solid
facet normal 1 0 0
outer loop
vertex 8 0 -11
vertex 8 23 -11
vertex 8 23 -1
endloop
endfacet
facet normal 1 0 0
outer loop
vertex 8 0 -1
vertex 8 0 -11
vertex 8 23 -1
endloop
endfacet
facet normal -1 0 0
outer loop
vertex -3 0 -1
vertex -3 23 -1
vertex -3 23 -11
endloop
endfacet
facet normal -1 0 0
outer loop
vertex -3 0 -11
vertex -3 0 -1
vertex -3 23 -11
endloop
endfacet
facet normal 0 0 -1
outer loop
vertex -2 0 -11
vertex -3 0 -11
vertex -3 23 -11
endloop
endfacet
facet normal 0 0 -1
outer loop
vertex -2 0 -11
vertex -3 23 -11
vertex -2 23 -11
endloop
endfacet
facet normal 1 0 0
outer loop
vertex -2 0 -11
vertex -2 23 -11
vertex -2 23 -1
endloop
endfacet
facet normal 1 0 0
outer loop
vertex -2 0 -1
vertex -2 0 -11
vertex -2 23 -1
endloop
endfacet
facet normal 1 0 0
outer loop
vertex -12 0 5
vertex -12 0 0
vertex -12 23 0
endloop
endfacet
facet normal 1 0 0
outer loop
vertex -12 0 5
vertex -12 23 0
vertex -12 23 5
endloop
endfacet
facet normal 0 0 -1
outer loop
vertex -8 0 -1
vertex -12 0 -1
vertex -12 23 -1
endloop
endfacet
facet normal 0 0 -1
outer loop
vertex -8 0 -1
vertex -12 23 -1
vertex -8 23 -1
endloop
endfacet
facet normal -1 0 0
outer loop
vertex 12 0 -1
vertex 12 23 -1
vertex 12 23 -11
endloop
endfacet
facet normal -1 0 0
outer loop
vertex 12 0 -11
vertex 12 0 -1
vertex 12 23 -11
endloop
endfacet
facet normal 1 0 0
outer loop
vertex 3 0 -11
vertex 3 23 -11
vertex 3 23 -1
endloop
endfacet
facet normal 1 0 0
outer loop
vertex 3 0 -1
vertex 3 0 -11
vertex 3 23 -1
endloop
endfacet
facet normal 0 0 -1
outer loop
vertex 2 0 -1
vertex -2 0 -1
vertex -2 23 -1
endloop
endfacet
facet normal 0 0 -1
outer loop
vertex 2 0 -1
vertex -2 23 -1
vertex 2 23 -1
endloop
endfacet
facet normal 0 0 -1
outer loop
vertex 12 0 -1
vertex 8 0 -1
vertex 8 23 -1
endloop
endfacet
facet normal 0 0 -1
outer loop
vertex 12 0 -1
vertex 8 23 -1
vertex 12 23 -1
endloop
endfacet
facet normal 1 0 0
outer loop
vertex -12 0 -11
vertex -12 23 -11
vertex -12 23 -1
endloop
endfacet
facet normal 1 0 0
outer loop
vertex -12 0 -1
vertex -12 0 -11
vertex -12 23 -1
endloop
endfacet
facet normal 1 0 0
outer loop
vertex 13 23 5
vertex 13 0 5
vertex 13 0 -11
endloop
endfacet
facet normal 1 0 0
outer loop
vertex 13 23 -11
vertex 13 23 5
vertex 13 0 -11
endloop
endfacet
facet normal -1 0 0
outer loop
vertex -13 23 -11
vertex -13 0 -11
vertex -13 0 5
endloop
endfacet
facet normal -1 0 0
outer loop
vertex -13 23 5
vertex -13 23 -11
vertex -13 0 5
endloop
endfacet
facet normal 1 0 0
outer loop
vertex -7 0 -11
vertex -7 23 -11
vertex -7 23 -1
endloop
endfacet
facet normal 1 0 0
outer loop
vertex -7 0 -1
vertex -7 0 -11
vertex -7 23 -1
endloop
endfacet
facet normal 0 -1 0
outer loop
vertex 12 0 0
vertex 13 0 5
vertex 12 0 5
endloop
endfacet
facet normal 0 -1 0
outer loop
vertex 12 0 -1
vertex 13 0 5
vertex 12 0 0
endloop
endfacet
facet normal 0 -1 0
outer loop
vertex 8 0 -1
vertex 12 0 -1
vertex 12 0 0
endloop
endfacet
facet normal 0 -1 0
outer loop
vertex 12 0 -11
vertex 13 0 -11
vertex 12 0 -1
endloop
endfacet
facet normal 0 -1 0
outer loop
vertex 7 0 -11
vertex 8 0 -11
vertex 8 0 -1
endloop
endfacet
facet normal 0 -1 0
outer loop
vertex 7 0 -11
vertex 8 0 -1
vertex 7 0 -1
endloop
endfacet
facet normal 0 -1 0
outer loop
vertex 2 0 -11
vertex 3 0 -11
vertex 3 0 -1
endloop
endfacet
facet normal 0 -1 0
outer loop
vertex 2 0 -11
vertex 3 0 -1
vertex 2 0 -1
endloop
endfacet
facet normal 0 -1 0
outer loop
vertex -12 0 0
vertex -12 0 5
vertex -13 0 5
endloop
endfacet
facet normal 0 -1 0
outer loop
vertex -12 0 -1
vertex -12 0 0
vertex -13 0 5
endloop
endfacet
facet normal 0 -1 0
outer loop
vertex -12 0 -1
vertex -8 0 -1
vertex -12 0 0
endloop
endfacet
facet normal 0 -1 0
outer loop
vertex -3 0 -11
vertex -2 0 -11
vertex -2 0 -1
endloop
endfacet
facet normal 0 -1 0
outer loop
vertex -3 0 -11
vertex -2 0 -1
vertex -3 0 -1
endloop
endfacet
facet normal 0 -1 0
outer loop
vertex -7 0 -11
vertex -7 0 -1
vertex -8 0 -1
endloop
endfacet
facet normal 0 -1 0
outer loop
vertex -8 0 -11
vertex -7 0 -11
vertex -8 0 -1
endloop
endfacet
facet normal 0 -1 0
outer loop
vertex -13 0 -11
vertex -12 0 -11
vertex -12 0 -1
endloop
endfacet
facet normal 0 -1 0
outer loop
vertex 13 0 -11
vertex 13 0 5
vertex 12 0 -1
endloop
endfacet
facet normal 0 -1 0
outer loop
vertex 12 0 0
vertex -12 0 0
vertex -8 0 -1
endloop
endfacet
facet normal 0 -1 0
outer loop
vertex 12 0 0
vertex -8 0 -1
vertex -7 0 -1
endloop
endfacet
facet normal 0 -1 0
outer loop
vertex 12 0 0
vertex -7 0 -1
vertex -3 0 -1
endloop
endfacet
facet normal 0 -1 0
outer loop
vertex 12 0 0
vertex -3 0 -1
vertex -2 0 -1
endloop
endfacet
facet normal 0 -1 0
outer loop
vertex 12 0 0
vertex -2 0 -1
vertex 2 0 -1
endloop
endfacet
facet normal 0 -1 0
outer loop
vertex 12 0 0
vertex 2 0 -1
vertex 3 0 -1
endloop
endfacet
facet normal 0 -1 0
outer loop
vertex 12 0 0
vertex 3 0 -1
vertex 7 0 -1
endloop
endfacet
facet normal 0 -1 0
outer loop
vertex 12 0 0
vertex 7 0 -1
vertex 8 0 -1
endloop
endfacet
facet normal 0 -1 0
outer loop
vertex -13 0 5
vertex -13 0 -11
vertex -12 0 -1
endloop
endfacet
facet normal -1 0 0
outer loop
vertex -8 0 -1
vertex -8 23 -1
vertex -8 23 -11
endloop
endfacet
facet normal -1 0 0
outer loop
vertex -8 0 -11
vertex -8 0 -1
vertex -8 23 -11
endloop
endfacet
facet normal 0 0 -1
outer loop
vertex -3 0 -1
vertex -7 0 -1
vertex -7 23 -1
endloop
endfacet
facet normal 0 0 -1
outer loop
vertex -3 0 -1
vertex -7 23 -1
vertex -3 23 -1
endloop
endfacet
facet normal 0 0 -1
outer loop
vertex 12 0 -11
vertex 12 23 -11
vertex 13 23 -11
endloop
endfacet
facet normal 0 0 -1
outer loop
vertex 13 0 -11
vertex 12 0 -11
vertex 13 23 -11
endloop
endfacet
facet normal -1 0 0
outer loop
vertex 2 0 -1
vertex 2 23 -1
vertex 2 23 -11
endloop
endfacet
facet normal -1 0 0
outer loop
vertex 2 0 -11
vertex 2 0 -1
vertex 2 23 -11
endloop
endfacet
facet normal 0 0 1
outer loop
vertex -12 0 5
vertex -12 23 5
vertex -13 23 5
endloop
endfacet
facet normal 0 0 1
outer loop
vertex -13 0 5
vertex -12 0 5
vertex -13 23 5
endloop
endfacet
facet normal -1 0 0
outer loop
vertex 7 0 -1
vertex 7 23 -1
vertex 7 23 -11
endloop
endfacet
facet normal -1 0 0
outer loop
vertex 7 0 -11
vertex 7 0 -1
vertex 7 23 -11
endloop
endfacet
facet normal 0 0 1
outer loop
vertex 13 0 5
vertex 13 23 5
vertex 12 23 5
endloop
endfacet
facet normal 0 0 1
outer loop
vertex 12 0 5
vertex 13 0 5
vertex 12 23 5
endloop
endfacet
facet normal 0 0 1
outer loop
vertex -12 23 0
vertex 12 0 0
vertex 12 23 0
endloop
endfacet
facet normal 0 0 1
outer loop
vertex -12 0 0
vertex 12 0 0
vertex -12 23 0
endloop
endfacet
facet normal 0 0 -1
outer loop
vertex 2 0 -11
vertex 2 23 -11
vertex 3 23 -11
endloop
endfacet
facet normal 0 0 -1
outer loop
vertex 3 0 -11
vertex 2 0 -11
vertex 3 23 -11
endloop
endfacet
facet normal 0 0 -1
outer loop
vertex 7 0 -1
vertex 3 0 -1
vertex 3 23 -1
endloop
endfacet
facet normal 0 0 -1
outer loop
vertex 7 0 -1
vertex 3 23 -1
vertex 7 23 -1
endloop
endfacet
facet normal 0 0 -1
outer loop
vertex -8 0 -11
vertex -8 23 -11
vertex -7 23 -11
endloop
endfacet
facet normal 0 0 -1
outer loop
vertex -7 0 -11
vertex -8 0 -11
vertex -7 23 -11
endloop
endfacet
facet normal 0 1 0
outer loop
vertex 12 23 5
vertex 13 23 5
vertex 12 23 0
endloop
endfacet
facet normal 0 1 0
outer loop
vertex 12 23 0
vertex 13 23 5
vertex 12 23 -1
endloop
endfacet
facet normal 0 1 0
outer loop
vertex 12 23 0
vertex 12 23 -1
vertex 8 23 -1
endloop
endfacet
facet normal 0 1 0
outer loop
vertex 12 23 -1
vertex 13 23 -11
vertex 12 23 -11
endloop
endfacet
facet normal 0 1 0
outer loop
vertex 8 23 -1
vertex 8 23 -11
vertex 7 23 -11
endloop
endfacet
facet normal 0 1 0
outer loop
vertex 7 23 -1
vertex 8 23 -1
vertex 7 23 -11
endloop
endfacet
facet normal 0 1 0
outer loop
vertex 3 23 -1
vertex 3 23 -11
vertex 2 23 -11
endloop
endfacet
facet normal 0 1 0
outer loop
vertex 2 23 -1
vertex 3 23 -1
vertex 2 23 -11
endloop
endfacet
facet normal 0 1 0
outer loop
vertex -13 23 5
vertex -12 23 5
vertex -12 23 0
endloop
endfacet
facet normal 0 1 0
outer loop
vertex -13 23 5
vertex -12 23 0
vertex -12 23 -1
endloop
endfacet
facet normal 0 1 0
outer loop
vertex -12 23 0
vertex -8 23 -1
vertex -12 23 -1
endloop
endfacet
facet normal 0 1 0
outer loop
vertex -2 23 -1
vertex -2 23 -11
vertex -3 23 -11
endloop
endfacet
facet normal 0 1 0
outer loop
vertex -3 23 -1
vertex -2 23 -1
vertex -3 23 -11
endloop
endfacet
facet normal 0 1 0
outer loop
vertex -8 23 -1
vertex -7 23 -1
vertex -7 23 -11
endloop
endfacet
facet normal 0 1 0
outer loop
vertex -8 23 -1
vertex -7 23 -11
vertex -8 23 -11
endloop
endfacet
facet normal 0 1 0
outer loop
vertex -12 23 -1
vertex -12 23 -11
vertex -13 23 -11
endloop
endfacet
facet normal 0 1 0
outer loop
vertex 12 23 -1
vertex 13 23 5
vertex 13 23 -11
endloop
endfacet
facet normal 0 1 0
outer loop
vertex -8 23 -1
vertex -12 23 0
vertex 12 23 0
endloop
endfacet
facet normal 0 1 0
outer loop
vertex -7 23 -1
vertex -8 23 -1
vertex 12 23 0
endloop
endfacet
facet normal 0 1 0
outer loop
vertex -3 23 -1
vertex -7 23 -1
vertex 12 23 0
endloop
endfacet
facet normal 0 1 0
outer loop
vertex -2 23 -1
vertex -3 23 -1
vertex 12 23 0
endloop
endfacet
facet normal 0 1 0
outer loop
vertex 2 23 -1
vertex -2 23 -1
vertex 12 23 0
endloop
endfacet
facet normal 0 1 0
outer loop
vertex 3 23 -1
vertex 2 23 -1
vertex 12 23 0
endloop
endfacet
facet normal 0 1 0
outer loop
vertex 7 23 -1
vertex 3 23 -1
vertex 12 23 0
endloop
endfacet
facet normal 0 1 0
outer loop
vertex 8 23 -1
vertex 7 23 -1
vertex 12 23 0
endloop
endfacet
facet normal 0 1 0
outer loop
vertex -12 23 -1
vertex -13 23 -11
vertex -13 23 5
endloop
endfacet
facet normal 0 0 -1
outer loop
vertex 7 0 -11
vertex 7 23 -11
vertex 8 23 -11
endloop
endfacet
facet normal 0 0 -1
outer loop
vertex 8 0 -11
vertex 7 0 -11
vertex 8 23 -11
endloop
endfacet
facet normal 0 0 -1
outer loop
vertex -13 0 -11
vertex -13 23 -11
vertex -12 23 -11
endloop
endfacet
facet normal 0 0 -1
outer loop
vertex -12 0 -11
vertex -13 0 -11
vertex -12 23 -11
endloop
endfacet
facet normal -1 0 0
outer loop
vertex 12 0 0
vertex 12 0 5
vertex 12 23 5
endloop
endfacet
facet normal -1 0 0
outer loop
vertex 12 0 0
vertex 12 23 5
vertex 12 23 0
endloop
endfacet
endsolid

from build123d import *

# Parameters (mm, degrees)
BOSS_EXTRU_1_DEPTH = 23


with BuildPart() as part:
    # Esquisse1 → Boss.-Extru.1 (new body)
    with BuildSketch(Plane(origin=(0, 0, 0), x_dir=(1, 0, 0), z_dir=(0, 1, 0))):
        Polygon((7, 11), (8, 11), (8, 1), (12, 1), (12, 11), (13, 11), (13, -3.968463396), (13, -5), (12, -5), (12, 0), (-12, 0), (-12, -5), (-13, -5), (-13, -3.968463396), (-13, 11), (-12, 11), (-12, 1), (-8, 1), (-8, 11), (-7, 11), (-7, 1), (-3, 1), (-3, 11), (-2, 11), (-2, 1), (2, 1), (2, 11), (3, 11), (3, 1), (7, 1), align=None)
    extrude(amount=BOSS_EXTRU_1_DEPTH)


solid = part.part
